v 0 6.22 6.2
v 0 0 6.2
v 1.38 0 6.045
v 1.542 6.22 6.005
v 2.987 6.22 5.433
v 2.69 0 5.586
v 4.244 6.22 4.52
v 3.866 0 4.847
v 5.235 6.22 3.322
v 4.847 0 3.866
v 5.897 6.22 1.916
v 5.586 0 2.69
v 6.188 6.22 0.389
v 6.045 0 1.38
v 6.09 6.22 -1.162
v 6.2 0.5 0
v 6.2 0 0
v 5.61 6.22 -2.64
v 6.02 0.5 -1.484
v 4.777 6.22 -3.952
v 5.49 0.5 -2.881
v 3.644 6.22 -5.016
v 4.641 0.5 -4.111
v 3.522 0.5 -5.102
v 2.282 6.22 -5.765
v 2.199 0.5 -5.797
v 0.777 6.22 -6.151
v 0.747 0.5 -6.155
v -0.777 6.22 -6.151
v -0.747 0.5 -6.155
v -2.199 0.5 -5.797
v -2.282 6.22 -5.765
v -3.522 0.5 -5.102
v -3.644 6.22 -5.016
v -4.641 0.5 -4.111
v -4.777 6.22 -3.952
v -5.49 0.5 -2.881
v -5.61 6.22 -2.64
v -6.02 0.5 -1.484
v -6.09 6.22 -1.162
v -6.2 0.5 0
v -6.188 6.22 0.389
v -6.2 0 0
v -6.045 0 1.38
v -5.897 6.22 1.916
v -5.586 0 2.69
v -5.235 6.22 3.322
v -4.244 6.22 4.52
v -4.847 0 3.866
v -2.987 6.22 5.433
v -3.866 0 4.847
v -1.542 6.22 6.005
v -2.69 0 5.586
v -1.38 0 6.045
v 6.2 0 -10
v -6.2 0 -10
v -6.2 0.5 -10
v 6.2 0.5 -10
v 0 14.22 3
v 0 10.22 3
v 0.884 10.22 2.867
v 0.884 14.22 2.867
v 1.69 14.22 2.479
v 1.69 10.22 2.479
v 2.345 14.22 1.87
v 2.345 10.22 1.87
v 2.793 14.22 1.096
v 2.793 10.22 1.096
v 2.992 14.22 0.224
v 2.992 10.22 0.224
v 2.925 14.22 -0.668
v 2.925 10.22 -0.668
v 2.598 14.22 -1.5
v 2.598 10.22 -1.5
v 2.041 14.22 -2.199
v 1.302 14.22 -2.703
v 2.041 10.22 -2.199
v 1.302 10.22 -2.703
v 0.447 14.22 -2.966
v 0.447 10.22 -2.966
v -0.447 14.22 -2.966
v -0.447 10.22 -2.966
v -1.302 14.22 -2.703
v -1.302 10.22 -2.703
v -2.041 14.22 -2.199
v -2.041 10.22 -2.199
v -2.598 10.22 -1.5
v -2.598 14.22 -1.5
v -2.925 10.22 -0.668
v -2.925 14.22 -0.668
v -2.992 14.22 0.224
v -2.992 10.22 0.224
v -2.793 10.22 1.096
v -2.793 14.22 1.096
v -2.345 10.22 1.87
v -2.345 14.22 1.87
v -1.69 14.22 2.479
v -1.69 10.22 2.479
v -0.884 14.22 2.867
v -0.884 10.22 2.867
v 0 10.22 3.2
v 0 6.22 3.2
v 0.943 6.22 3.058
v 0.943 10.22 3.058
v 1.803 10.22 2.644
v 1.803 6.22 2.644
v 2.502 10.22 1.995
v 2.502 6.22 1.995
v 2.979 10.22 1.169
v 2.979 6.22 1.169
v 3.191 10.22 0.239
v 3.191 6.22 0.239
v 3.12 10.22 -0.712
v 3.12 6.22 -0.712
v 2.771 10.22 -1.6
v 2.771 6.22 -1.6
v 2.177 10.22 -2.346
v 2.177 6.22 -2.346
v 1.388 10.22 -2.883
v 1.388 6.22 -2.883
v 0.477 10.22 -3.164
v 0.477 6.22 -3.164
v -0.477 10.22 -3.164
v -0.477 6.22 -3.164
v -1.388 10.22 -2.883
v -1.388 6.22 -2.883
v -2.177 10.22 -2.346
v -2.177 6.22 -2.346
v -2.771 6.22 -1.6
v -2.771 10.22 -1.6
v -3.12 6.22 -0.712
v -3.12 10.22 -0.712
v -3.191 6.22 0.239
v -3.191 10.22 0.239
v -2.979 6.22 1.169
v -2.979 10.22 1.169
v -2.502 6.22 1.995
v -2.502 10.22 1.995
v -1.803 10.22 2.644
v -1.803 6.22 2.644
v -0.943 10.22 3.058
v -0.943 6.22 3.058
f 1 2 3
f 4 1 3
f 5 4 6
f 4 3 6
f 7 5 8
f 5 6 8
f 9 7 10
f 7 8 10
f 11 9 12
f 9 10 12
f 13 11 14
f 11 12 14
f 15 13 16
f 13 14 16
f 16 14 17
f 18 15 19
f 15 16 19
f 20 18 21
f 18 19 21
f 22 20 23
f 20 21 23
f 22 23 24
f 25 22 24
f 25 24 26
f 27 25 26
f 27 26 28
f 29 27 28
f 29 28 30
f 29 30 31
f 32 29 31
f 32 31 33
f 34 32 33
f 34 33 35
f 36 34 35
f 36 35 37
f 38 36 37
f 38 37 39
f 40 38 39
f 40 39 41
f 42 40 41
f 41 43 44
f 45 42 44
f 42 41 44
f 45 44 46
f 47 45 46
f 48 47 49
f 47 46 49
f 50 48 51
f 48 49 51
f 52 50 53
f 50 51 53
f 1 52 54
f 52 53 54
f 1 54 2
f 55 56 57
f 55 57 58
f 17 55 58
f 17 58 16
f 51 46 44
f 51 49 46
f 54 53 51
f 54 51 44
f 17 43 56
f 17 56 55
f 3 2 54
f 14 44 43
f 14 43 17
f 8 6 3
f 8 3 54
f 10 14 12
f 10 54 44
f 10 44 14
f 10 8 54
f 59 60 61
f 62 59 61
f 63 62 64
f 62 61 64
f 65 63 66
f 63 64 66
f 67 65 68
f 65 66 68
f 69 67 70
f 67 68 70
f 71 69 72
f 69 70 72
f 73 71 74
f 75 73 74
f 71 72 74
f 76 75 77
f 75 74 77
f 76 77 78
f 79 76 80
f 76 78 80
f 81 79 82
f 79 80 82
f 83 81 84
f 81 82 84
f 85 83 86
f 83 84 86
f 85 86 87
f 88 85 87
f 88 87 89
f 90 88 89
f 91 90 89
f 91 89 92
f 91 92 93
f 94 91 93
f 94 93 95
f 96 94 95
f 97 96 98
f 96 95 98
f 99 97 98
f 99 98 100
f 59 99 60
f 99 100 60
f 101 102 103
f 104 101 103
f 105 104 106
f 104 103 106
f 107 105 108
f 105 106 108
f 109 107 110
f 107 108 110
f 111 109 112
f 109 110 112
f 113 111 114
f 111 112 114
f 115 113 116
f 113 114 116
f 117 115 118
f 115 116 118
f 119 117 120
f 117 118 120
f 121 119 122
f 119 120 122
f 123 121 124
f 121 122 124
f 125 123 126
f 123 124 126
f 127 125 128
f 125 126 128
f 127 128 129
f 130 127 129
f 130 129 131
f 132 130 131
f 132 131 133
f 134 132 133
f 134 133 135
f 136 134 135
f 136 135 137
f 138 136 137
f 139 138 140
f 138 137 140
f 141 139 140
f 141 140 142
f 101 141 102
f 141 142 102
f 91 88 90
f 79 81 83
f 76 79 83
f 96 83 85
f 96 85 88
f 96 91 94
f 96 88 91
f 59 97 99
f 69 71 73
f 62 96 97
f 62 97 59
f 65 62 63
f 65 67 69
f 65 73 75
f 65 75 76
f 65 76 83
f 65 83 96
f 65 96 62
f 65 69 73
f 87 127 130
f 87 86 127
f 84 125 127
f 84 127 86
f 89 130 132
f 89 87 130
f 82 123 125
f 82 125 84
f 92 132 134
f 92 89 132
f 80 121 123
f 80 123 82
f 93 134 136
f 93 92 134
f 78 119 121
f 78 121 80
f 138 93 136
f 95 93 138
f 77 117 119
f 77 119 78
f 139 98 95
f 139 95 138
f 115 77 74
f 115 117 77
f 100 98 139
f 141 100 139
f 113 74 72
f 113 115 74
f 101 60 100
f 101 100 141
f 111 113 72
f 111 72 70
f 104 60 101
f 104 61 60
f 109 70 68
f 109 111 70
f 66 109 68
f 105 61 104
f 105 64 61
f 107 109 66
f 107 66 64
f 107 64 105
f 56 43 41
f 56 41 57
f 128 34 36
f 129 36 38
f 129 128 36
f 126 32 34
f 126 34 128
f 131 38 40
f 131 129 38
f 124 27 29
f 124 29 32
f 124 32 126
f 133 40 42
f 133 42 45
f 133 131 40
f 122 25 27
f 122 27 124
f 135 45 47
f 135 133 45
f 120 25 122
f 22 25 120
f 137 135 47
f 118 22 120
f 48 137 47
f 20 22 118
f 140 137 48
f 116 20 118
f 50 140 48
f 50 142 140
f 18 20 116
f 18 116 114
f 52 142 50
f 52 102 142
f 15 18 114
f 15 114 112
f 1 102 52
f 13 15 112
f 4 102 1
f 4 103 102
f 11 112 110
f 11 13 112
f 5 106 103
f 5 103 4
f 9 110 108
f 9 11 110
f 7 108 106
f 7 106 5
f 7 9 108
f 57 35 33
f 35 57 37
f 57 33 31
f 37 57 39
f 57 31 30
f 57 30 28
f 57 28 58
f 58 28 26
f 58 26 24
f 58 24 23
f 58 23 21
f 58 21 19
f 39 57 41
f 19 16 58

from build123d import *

# Parameters (mm, degrees)
SKETCH_1_R      = 6.2
EXTRUDE_1_DEPTH = 6.22
EXTRUDE_2_DEPTH = 0.5
SKETCH_3_R      = 3.2
EXTRUDE_3_DEPTH = 4
SKETCH_4_R      = 3
EXTRUDE_4_DEPTH = 4


with BuildPart() as part:
    # Эскиз1 → Вытянуть1 (new body)
    with BuildSketch(Plane(origin=(0, 0, 0), x_dir=(1, 0, 0), z_dir=(0, 1, 0))):
        with Locations(Location((0, 0, 0), (0, 0, 270))):
            Circle(SKETCH_1_R)
    extrude(amount=EXTRUDE_1_DEPTH)

    # Эскиз2 → Вытянуть2 (add)
    with BuildSketch(Plane.XZ):
        with BuildLine():
            Line((-6.2, 0), (-6.2, -10))
            Line((-6.2, -10), (6.2, -10))
            Line((6.2, -10), (6.2, 0))
            ThreePointArc((6.2, 0), (0, 6.2), (-6.2, 0))
        make_face()
    extrude(amount=-EXTRUDE_2_DEPTH)

    # Эскиз3 → Вытянуть3 (add)
    with BuildSketch(Plane(origin=(0, 6.22, 0), x_dir=(1, 0, 0), z_dir=(0, 1, 0))):
        with Locations(Location((0, 0, 0), (0, 0, 270))):
            Circle(SKETCH_3_R)
    extrude(amount=EXTRUDE_3_DEPTH)

    # Эскиз4 → Вытянуть4 (add)
    with BuildSketch(Plane(origin=(0, 10.22, 0), x_dir=(-1, 0, 0), z_dir=(0, 1, 0))):
        with Locations(Location((0, 0, 0), (0, 0, 90))):
            Circle(SKETCH_4_R)
    extrude(amount=EXTRUDE_4_DEPTH)


solid = part.part
